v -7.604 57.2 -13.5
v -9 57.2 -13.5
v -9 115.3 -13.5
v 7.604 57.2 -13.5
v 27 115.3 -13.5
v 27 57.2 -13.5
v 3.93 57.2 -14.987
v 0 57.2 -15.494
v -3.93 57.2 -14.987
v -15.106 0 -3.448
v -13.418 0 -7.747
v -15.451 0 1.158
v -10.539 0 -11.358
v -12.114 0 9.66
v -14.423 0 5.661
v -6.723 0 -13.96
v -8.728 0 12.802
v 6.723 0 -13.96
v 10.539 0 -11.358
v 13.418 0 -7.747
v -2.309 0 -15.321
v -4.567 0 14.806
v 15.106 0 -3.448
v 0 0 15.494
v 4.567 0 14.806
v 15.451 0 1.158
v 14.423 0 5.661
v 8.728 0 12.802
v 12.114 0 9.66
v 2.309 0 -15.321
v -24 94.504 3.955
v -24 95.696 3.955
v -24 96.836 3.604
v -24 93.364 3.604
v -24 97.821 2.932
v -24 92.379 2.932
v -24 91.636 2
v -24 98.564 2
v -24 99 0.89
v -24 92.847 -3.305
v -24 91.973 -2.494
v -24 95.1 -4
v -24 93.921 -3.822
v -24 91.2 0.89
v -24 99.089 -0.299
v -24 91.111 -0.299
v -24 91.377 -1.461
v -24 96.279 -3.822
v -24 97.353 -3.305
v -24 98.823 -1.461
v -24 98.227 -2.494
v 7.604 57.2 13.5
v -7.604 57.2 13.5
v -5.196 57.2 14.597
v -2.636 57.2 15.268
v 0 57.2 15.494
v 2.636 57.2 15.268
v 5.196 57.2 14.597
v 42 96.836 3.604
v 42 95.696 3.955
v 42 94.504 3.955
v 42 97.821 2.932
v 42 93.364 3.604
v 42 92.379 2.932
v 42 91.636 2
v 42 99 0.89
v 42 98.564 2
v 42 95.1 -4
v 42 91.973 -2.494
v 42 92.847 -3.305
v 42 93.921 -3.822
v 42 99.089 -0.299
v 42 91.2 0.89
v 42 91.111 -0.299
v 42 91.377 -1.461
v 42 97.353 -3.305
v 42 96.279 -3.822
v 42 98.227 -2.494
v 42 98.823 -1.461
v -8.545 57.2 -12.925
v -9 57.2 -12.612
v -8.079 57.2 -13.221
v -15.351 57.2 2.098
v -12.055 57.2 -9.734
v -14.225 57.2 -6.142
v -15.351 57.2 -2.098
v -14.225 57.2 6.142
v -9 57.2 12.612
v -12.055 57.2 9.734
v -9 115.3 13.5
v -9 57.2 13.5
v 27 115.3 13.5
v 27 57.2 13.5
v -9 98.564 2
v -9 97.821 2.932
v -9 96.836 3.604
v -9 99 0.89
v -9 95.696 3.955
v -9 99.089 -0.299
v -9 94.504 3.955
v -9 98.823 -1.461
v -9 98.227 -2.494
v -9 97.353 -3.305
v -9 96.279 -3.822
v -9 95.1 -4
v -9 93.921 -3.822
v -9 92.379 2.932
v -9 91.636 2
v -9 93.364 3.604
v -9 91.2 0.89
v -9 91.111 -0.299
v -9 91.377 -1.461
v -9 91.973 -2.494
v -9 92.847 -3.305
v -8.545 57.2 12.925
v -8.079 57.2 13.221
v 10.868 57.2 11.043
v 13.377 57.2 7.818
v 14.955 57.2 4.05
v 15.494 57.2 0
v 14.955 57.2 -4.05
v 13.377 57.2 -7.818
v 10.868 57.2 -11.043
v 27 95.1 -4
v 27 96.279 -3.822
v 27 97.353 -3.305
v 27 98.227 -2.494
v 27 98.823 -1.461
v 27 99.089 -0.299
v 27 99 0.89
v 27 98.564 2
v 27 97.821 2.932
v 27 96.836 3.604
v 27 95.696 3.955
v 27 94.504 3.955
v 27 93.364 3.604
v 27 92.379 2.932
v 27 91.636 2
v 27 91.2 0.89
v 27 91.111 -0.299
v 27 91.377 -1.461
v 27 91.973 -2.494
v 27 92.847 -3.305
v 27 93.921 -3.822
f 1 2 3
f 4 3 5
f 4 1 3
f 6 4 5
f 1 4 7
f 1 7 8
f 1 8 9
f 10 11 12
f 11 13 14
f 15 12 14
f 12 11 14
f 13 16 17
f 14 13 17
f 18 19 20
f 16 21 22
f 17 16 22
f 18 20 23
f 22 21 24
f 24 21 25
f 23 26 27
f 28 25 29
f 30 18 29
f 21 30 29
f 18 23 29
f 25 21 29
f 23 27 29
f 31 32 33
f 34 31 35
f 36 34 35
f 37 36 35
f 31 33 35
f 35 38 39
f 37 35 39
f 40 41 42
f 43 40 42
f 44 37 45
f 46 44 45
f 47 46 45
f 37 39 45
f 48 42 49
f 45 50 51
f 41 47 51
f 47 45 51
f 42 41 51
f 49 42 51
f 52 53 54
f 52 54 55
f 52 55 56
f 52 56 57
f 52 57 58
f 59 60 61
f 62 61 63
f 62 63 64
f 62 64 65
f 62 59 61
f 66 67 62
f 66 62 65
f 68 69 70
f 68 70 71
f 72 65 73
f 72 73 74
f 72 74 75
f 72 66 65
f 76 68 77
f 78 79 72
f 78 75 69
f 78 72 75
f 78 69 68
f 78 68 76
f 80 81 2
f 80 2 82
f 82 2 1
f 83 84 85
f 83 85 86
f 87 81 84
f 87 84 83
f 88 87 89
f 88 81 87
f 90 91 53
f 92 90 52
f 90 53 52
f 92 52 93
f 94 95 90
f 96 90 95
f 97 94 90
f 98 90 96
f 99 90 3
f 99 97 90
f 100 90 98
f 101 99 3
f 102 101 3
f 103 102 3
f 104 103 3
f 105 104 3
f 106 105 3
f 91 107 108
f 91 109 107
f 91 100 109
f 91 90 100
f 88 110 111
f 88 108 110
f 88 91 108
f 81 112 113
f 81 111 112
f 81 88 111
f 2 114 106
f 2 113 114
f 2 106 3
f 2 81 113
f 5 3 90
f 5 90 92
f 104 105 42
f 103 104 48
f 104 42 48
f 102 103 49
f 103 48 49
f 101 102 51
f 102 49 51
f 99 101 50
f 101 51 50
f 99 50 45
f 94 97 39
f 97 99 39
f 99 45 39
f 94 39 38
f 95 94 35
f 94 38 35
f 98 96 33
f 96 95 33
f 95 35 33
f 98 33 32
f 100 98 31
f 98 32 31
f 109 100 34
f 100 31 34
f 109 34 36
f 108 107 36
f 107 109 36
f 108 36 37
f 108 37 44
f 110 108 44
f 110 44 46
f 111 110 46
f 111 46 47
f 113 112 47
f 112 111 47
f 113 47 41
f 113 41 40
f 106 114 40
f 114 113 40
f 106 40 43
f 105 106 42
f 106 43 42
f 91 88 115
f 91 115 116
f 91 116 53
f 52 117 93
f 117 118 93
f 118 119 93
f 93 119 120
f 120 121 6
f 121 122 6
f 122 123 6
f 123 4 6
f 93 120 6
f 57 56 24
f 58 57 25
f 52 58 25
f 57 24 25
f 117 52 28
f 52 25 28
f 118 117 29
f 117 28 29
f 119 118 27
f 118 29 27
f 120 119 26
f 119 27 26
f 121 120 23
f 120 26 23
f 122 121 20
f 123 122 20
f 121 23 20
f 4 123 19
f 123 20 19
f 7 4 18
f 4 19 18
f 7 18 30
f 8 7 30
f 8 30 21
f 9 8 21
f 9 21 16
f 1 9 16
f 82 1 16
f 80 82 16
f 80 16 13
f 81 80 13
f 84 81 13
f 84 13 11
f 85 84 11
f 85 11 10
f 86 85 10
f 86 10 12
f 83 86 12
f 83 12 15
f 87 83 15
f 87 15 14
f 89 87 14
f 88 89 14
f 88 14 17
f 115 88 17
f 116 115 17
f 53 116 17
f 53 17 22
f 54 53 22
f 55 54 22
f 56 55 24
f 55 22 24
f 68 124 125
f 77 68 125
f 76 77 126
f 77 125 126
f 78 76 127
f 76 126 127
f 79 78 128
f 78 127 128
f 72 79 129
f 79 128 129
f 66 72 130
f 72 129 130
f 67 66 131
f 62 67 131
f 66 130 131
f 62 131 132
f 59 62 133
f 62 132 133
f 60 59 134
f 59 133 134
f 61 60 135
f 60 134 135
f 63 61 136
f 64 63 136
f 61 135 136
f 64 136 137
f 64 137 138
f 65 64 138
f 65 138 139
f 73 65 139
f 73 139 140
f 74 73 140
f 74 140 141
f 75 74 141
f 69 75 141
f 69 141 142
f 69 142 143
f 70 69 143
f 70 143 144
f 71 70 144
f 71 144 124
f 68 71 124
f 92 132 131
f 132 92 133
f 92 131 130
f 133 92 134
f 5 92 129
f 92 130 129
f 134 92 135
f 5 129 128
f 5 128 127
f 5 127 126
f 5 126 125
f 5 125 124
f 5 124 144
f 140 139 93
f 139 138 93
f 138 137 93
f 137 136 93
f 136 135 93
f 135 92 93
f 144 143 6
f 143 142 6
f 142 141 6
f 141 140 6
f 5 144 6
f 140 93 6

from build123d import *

# Parameters (mm, degrees)
SKETCH2_R                = 15.494
BOSS_EXTRUDE1_DEPTH      = 57.2
SKETCH3_W                = 36
SKETCH3_H                = 27
BOSS_EXTRUDE2_DEPTH      = 58.1
BOSS_EXTRUDE3_DEPTH      = 15
BOSS_EXTRUDE3_DEPTH_BACK = 51
SKETCH4_R                = 4


with BuildPart() as part:
    # Sketch2 → Boss-Extrude1 (new body)
    with BuildSketch(Plane(origin=(0, 0, 0), x_dir=(1, 0, 0), z_dir=(0, 1, 0))):
        with Locations(Location((0, 0, 0), (0, 0, 270))):
            Circle(SKETCH2_R)
    extrude(amount=BOSS_EXTRUDE1_DEPTH)

    # Sketch3 → Boss-Extrude2 (add)
    with BuildSketch(Plane(origin=(0, 57.2, 0), x_dir=(1, 0, 0), z_dir=(0, 1, 0))):
        with Locations((9, 0)):
            Rectangle(SKETCH3_W, SKETCH3_H)
    extrude(amount=BOSS_EXTRUDE2_DEPTH)

    # Sketch4 → Boss-Extrude3 (add, two sides: drawn at the far end of the back side and taken through both)
    with BuildSketch(Plane(origin=(27, 0, 0), x_dir=(0, 0, -1), z_dir=(1, 0, 0)).offset(-BOSS_EXTRUDE3_DEPTH_BACK)):
        with Locations((0, 95.1)):
            Circle(SKETCH4_R)
    extrude(amount=BOSS_EXTRUDE3_DEPTH + BOSS_EXTRUDE3_DEPTH_BACK)


solid = part.part
